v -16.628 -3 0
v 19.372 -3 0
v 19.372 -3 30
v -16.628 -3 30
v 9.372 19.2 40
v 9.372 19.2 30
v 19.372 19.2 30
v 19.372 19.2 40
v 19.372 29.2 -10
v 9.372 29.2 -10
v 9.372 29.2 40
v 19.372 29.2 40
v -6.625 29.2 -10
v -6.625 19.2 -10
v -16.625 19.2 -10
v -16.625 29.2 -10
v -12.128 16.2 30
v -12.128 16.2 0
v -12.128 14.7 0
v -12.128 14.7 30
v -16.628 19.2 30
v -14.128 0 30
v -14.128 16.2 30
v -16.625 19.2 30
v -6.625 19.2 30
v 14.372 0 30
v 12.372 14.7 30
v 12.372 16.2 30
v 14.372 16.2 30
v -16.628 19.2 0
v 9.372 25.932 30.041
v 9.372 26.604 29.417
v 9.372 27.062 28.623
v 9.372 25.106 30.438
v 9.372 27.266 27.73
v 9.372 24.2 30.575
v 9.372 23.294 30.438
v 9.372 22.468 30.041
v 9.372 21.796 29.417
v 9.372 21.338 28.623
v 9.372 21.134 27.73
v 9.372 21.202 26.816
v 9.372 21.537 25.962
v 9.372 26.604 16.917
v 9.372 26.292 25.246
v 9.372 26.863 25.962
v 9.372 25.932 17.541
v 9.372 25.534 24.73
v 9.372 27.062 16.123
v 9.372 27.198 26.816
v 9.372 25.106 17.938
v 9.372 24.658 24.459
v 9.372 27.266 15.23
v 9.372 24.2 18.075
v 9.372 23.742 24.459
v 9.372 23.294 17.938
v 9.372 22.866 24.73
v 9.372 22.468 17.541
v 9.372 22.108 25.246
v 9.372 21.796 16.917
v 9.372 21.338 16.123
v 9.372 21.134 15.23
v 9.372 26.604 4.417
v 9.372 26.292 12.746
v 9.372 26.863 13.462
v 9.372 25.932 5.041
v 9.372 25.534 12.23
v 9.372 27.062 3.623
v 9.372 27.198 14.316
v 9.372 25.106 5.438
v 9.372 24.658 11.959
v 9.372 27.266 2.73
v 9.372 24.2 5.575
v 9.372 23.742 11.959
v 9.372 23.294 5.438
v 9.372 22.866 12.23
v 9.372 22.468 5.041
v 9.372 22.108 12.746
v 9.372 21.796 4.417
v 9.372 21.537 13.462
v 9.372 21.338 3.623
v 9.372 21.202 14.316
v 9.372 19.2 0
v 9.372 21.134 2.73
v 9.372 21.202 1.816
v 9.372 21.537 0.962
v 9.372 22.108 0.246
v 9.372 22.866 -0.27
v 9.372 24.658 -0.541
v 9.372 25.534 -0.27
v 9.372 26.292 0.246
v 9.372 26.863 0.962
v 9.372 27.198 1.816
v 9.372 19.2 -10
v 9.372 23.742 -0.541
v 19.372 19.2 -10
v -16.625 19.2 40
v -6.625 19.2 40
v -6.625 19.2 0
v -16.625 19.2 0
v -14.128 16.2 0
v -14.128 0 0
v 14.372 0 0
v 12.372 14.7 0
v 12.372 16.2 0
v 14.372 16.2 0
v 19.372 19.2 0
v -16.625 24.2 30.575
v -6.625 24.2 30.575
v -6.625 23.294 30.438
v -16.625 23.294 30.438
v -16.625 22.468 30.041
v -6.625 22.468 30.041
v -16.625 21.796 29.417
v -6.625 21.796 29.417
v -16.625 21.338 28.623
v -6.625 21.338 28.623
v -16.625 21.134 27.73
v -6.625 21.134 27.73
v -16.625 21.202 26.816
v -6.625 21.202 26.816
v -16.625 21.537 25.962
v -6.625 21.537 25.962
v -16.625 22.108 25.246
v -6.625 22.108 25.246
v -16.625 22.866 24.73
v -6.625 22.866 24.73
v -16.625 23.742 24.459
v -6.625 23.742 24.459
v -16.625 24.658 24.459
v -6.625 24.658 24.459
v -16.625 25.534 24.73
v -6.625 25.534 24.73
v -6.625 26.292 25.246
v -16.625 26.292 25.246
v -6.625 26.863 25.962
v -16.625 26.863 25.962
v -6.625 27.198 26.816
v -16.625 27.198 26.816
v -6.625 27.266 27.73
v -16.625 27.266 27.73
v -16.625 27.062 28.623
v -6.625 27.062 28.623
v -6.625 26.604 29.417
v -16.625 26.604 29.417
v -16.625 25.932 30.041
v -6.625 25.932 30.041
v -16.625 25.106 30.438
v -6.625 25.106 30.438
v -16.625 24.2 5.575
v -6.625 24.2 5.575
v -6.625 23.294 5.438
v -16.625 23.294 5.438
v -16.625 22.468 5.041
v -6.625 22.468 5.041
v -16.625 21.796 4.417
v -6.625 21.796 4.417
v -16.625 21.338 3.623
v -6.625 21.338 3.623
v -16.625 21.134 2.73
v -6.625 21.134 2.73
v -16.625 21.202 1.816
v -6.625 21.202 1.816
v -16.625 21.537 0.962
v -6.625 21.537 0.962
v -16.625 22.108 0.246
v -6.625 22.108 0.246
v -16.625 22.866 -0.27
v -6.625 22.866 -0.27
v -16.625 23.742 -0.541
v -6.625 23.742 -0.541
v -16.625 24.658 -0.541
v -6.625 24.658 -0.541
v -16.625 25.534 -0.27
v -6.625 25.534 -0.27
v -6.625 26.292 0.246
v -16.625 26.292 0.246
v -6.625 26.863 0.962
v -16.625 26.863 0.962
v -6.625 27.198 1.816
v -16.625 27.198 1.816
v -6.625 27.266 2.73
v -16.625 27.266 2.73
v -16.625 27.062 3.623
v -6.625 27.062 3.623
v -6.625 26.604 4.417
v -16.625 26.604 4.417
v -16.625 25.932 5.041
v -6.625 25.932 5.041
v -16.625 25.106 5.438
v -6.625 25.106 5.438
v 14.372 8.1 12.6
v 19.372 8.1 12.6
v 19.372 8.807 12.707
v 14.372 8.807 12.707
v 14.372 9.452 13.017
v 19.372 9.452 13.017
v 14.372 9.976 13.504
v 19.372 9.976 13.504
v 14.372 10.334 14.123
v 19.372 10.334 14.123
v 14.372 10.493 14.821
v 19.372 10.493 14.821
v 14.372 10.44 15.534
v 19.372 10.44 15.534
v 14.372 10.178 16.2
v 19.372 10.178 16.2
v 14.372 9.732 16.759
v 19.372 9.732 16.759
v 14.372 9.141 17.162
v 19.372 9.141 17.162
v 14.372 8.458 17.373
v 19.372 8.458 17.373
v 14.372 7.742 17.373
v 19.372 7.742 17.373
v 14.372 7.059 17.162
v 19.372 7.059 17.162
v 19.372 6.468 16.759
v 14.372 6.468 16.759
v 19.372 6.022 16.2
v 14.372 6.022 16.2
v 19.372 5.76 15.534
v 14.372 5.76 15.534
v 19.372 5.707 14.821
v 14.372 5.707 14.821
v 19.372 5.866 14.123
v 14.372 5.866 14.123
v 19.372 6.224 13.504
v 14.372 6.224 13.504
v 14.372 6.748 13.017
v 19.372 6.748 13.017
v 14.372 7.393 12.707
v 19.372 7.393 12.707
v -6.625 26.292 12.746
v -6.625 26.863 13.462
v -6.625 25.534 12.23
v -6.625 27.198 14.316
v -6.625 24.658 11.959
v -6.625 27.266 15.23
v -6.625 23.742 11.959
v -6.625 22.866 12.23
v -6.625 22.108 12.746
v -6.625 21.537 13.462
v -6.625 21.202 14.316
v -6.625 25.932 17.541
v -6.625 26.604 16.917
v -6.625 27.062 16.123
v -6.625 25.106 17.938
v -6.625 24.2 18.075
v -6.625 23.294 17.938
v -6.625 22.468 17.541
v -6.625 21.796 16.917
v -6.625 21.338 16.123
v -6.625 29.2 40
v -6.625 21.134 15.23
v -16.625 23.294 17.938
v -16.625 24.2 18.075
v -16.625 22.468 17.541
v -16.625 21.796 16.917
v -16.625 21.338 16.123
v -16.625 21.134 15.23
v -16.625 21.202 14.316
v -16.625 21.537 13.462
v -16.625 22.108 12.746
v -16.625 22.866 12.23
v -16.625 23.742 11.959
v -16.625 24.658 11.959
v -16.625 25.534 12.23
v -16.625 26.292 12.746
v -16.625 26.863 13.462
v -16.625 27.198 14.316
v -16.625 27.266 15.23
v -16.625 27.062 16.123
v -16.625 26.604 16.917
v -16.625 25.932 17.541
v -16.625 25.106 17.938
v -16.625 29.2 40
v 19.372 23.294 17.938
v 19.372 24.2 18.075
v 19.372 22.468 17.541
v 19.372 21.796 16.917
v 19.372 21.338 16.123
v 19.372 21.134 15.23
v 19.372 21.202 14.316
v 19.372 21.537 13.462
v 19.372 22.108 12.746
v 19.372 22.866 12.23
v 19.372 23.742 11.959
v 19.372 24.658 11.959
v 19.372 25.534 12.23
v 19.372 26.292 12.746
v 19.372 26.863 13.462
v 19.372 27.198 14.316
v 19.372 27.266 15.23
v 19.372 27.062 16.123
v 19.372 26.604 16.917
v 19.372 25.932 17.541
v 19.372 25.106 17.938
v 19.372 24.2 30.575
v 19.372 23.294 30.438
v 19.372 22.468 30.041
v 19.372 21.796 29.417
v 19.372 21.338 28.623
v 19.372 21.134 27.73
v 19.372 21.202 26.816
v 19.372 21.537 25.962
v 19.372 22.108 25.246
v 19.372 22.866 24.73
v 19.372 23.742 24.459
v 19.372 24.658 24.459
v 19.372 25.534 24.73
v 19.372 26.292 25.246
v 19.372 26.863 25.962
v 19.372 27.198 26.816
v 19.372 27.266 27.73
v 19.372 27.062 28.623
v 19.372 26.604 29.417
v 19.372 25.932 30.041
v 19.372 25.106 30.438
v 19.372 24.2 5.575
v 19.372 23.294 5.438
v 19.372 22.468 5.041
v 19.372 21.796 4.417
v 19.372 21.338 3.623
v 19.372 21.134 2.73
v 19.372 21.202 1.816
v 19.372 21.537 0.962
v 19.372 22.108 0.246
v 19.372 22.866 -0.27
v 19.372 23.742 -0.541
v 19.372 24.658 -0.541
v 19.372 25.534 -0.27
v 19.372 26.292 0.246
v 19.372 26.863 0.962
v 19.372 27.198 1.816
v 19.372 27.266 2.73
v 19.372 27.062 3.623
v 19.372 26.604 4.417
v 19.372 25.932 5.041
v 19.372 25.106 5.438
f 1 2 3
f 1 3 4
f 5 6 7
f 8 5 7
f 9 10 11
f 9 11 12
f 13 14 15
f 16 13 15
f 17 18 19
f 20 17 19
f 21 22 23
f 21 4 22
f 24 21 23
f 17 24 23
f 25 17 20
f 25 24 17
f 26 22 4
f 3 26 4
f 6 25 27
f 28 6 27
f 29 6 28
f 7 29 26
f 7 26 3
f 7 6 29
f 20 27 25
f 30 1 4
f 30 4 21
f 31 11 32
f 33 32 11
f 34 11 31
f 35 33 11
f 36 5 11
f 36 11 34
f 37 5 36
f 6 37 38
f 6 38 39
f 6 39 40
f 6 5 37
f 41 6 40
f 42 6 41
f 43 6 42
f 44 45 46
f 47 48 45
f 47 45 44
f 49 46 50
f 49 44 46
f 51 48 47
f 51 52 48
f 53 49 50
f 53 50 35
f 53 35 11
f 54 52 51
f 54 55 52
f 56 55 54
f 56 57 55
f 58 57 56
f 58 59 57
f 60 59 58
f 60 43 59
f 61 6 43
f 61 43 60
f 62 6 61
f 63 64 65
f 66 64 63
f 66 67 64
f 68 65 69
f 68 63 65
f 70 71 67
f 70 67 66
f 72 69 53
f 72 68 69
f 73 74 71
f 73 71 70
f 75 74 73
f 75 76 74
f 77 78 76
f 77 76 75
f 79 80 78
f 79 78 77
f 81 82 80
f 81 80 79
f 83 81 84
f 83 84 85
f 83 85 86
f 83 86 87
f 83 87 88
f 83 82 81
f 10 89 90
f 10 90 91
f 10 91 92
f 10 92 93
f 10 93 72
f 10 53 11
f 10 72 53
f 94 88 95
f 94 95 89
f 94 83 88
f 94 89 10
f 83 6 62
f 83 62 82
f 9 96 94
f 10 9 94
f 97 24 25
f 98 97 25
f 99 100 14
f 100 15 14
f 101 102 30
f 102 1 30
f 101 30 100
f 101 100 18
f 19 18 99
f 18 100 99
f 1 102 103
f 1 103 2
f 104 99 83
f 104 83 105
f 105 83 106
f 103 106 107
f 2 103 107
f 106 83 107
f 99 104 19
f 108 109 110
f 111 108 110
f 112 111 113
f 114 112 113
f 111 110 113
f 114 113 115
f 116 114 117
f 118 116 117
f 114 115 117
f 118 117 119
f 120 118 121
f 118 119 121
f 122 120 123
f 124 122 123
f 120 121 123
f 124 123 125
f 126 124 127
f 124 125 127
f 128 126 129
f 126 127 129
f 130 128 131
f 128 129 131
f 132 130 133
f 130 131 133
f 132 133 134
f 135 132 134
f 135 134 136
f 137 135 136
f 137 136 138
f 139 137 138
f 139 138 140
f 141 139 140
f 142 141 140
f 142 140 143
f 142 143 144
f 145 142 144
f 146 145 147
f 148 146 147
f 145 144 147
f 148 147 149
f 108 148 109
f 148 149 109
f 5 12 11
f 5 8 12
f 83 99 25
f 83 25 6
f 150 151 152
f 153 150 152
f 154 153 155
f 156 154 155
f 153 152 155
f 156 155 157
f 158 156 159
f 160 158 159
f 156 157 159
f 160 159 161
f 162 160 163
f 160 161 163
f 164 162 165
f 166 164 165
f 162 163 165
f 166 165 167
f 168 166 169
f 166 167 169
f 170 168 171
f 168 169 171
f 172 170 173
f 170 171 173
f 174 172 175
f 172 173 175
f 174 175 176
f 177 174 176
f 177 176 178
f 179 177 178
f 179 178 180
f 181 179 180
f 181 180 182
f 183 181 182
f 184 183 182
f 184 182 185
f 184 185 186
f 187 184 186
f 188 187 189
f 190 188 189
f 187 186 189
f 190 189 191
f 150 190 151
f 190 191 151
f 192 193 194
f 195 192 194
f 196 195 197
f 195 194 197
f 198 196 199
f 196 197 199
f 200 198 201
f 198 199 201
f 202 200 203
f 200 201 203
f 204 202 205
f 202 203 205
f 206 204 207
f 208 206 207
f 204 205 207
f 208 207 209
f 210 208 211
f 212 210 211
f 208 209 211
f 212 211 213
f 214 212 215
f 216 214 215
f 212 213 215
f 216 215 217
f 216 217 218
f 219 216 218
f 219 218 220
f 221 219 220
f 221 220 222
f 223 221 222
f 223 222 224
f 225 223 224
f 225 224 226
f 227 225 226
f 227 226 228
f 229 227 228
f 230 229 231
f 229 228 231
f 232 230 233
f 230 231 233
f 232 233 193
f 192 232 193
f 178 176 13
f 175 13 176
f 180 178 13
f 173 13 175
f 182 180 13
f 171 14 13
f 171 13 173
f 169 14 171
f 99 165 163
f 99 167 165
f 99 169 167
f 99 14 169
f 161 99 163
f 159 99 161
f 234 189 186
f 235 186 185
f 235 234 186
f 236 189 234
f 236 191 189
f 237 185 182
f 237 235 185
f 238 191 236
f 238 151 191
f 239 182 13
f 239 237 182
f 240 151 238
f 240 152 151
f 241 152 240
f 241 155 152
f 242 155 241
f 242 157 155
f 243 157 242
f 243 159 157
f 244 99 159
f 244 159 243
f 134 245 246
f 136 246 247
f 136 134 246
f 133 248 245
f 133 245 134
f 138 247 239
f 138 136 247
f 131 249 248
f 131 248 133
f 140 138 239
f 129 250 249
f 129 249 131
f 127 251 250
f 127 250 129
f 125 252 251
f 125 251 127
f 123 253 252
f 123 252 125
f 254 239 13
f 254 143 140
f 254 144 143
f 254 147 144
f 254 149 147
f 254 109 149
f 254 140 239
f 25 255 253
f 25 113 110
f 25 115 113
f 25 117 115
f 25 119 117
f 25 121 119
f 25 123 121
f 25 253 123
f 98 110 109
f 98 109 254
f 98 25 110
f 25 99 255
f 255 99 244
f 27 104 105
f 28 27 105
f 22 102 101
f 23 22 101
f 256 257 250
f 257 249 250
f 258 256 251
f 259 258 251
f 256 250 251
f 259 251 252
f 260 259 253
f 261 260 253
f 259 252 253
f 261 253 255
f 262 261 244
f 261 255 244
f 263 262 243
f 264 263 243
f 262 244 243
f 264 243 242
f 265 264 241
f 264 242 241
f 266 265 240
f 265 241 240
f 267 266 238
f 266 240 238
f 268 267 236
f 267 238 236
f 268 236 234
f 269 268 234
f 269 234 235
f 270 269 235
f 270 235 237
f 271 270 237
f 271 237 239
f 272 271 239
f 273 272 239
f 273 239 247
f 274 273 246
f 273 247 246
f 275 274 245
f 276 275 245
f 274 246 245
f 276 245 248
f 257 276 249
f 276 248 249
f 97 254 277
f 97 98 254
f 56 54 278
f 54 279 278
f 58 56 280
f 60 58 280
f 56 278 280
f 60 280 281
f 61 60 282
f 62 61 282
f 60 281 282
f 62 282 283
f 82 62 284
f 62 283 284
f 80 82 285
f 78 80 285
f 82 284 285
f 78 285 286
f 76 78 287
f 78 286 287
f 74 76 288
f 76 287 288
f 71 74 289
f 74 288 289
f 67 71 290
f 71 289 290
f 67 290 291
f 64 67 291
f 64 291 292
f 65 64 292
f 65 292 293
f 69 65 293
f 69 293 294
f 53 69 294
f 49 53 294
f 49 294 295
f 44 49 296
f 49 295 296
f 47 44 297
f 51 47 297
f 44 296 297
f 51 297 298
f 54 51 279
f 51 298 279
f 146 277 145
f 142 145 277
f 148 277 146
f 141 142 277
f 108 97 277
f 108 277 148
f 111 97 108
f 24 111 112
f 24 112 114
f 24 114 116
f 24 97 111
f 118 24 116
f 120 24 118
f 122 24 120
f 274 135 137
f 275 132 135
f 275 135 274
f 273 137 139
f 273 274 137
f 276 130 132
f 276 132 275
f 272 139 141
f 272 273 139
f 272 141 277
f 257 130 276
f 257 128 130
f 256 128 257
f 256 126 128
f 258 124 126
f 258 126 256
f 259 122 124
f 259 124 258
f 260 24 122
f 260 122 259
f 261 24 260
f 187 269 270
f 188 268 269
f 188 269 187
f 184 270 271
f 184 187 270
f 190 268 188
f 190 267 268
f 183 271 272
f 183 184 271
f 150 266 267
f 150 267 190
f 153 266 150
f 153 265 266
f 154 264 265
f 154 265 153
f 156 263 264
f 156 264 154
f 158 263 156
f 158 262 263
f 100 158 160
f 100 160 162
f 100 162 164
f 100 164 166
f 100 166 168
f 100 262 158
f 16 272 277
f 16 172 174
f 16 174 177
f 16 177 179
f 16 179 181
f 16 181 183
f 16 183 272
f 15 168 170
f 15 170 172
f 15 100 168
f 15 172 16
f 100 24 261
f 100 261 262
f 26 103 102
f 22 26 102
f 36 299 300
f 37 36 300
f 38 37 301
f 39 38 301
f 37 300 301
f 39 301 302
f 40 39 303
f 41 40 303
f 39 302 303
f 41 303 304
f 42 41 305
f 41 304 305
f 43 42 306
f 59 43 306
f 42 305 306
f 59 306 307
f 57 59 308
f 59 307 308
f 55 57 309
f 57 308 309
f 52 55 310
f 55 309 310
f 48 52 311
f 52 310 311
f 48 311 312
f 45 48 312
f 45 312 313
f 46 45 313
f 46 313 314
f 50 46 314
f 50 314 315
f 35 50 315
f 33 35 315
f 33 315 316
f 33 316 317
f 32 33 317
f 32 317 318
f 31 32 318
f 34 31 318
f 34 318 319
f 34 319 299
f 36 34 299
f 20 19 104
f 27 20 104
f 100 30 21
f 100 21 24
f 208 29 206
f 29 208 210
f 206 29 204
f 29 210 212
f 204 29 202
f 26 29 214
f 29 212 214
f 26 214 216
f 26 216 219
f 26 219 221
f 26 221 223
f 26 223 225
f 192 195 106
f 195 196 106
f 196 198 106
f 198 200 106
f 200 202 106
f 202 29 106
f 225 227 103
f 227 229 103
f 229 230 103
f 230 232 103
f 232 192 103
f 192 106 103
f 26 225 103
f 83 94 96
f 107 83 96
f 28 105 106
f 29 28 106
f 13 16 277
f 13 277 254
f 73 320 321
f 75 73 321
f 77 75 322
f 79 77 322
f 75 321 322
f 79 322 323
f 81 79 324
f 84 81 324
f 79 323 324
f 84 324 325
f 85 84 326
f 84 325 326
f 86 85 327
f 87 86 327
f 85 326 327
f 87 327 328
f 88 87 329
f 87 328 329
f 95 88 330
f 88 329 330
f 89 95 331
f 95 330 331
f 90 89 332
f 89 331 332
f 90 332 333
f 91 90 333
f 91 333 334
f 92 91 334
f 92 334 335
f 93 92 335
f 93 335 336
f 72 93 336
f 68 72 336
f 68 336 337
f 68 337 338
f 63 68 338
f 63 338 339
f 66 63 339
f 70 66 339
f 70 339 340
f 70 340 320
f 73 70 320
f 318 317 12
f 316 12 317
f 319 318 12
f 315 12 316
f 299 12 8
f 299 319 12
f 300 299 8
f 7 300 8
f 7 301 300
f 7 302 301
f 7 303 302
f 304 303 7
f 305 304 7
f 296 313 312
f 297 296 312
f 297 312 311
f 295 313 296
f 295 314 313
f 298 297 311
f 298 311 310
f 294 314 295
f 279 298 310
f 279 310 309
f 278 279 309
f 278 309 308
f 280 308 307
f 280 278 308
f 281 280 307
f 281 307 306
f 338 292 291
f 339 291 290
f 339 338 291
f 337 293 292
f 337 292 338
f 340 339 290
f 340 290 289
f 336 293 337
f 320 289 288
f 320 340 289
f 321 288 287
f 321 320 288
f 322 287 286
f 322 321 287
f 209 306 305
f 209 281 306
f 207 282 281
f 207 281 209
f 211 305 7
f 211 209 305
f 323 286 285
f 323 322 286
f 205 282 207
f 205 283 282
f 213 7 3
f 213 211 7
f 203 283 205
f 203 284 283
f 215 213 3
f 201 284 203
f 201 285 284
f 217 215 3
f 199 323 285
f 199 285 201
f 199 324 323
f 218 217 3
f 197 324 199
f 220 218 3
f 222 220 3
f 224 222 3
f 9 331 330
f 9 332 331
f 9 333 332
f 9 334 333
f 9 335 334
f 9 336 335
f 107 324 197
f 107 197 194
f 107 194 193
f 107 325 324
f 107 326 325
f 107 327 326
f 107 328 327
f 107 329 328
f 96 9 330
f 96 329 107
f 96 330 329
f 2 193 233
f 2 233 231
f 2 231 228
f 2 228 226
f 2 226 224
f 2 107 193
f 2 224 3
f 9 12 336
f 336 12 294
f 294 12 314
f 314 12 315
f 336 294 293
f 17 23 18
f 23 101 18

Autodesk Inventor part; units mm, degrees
ref_plane "YZ Plane" through (0, 0, 0) normal (1, 0, 0) x (0, 1, 0)
ref_plane "XZ Plane" through (0, 0, 0) normal (0, 1, 0) x (-1, 0, 0)
ref_plane "XY Plane" through (0, 0, 0) normal (0, 0, 1) x (1, 0, 0)
sketch "Skizze1" plane through (0, 0, 0) normal (0, 0, 1) x (1, 0, 0)
  line L0 (-14.1284, 0) -> (-14.1284, 16.2)
  line L1 (-14.1284, 16.2) -> (-12.1284, 16.2)
  line L2 (-12.1284, 16.2) -> (-12.1284, 1.6)
  line L3 (-12.1284, 1.6) -> (12.3716, 1.6)
  line L4 (12.3716, 1.6) -> (12.3716, 16.2)
  line L5 (12.3716, 16.2) -> (14.3716, 16.2)
  line L6 (14.3716, 16.2) -> (14.3716, 0)
  line L7 (14.3716, 0) -> (-14.1284, 0)
  line L8 (-16.6284, 19.2) -> (19.3716, 19.2)
  line L9 (19.3716, 19.2) -> (19.3716, -3)
  line L10 (19.3716, -3) -> (-16.6284, -3)
  line L11 (-16.6284, -3) -> (-16.6284, 19.2)
  line L12 (-12.1284, 14.7) -> (12.3716, 14.7)
  point P0 (0, 0)
  dimension "d1" = 2
  dimension "d3" = 2
  dimension "d4" = 1.6
  dimension "d5" = 3
  dimension "d7" = 2.5
  dimension "d8" = 5
  dimension "d9" = 1.5
  dimension "d26" = 3
  dimension "d27" = 28.5
  dimension "d28" = 16.2
extrude "Extrusion1" add sketch "Skizze1" along normal blind 30
ref_plane "Arbeitsebene1" through (19.3716, -1, 28) normal (1, 0, 0) x (0, 0, -1)
sketch "Skizze5" plane through (19.3716, -1, 28) normal (1, 0, 0) x (0, 0, -1)
  circle A0 centre (13, 9.1) radius 2.4
  line L0 (13, 9.1) -> (-2, 9.1)
  line L1 (-2, 18.2) -> (-2, 0) projected
  line L2 (13, 9.1) -> (13, 20.2)
  line L3 (8, 20.2) -> (18, 20.2) projected
  line L4 (13, 9.1) -> (28, 9.1)
  point P0 (28, 1)
  dimension "d31" = 4.8
  dimension "d32" = 90
  dimension "d35" = 15
extrude "Extrusion5" cut sketch "Skizze5" against normal blind 10
sketch "Skizze6" plane through (-16.6284, 19.2, 0) normal (0, 1, 0) x (1, 0, 0)
  line L0 (36, -30) -> (0, -30) projected
  line L1 (36, -30) -> (26, -30)
  line L2 (26, -30) -> (26, 0)
  line L3 (26, 0) -> (36, 0)
  line L4 (36, 0) -> (36, -30)
  line L5 (0.0037, -30) -> (10.0037, -30)
  line L6 (10.0037, -30) -> (10.0037, 0)
  line L7 (10.0037, 0) -> (0.0037, 0)
  line L8 (0.0037, 0) -> (0.0037, -30)
  line L9 (26, -30) -> (36, -30)
  line L10 (36, -30) -> (36, -40)
  line L11 (36, -40) -> (26, -40)
  line L12 (26, -40) -> (26, -30)
  line L13 (26, 0) -> (36, 0)
  line L14 (36, 0) -> (36, 10)
  line L15 (36, 10) -> (26, 10)
  line L16 (26, 10) -> (26, 0)
  line L17 (0.0037, 0) -> (10.0037, 0)
  line L18 (10.0037, 0) -> (10.0037, 10)
  line L19 (10.0037, 10) -> (0.0037, 10)
  line L20 (0.0037, 10) -> (0.0037, 0)
  line L21 (0.0037, -30) -> (10.0037, -30)
  line L22 (10.0037, -30) -> (10.0037, -40)
  line L23 (10.0037, -40) -> (0.0037, -40)
  line L24 (0.0037, -40) -> (0.0037, -30)
  point P0 (16.6284, 0)
  dimension "d36" = 10
  dimension "d37" = 30
  dimension "d38" = 10
  dimension "d39" = 30
  dimension "d40" = 10
  dimension "d41" = 10
  dimension "d42" = 10
  dimension "d43" = 10
  dimension "d44" = 10
  dimension "d45" = 10
  dimension "d46" = 10
  dimension "d47" = 10
extrude "Extrusion7" add sketch "Skizze6" along normal blind 10
sketch "Skizze8" plane through (-16.6248, 19.2, 30) normal (-1, 0, 0) x (0, 0, 1)
  line L0 (-40, 0) -> (-40, 10) projected
  point P0 (-30, -19.2)
  point P1 (-27.5, 5)
  point P2 (-15, 5)
  point P3 (-2.5, 5)
  dimension "d52" = 12.5
  dimension "d53" = 12.5
  dimension "d54" = 12.5
hole "Bohrung1" at (-16.6248, 24.2, 2.5) at (-16.6248, 24.2, 15) at (-16.6248, 24.2, 27.5) direction (1, 0, 0) diameter 6.15 end through all
properties part number "Objektträgerhalter 2 6,15mm"
